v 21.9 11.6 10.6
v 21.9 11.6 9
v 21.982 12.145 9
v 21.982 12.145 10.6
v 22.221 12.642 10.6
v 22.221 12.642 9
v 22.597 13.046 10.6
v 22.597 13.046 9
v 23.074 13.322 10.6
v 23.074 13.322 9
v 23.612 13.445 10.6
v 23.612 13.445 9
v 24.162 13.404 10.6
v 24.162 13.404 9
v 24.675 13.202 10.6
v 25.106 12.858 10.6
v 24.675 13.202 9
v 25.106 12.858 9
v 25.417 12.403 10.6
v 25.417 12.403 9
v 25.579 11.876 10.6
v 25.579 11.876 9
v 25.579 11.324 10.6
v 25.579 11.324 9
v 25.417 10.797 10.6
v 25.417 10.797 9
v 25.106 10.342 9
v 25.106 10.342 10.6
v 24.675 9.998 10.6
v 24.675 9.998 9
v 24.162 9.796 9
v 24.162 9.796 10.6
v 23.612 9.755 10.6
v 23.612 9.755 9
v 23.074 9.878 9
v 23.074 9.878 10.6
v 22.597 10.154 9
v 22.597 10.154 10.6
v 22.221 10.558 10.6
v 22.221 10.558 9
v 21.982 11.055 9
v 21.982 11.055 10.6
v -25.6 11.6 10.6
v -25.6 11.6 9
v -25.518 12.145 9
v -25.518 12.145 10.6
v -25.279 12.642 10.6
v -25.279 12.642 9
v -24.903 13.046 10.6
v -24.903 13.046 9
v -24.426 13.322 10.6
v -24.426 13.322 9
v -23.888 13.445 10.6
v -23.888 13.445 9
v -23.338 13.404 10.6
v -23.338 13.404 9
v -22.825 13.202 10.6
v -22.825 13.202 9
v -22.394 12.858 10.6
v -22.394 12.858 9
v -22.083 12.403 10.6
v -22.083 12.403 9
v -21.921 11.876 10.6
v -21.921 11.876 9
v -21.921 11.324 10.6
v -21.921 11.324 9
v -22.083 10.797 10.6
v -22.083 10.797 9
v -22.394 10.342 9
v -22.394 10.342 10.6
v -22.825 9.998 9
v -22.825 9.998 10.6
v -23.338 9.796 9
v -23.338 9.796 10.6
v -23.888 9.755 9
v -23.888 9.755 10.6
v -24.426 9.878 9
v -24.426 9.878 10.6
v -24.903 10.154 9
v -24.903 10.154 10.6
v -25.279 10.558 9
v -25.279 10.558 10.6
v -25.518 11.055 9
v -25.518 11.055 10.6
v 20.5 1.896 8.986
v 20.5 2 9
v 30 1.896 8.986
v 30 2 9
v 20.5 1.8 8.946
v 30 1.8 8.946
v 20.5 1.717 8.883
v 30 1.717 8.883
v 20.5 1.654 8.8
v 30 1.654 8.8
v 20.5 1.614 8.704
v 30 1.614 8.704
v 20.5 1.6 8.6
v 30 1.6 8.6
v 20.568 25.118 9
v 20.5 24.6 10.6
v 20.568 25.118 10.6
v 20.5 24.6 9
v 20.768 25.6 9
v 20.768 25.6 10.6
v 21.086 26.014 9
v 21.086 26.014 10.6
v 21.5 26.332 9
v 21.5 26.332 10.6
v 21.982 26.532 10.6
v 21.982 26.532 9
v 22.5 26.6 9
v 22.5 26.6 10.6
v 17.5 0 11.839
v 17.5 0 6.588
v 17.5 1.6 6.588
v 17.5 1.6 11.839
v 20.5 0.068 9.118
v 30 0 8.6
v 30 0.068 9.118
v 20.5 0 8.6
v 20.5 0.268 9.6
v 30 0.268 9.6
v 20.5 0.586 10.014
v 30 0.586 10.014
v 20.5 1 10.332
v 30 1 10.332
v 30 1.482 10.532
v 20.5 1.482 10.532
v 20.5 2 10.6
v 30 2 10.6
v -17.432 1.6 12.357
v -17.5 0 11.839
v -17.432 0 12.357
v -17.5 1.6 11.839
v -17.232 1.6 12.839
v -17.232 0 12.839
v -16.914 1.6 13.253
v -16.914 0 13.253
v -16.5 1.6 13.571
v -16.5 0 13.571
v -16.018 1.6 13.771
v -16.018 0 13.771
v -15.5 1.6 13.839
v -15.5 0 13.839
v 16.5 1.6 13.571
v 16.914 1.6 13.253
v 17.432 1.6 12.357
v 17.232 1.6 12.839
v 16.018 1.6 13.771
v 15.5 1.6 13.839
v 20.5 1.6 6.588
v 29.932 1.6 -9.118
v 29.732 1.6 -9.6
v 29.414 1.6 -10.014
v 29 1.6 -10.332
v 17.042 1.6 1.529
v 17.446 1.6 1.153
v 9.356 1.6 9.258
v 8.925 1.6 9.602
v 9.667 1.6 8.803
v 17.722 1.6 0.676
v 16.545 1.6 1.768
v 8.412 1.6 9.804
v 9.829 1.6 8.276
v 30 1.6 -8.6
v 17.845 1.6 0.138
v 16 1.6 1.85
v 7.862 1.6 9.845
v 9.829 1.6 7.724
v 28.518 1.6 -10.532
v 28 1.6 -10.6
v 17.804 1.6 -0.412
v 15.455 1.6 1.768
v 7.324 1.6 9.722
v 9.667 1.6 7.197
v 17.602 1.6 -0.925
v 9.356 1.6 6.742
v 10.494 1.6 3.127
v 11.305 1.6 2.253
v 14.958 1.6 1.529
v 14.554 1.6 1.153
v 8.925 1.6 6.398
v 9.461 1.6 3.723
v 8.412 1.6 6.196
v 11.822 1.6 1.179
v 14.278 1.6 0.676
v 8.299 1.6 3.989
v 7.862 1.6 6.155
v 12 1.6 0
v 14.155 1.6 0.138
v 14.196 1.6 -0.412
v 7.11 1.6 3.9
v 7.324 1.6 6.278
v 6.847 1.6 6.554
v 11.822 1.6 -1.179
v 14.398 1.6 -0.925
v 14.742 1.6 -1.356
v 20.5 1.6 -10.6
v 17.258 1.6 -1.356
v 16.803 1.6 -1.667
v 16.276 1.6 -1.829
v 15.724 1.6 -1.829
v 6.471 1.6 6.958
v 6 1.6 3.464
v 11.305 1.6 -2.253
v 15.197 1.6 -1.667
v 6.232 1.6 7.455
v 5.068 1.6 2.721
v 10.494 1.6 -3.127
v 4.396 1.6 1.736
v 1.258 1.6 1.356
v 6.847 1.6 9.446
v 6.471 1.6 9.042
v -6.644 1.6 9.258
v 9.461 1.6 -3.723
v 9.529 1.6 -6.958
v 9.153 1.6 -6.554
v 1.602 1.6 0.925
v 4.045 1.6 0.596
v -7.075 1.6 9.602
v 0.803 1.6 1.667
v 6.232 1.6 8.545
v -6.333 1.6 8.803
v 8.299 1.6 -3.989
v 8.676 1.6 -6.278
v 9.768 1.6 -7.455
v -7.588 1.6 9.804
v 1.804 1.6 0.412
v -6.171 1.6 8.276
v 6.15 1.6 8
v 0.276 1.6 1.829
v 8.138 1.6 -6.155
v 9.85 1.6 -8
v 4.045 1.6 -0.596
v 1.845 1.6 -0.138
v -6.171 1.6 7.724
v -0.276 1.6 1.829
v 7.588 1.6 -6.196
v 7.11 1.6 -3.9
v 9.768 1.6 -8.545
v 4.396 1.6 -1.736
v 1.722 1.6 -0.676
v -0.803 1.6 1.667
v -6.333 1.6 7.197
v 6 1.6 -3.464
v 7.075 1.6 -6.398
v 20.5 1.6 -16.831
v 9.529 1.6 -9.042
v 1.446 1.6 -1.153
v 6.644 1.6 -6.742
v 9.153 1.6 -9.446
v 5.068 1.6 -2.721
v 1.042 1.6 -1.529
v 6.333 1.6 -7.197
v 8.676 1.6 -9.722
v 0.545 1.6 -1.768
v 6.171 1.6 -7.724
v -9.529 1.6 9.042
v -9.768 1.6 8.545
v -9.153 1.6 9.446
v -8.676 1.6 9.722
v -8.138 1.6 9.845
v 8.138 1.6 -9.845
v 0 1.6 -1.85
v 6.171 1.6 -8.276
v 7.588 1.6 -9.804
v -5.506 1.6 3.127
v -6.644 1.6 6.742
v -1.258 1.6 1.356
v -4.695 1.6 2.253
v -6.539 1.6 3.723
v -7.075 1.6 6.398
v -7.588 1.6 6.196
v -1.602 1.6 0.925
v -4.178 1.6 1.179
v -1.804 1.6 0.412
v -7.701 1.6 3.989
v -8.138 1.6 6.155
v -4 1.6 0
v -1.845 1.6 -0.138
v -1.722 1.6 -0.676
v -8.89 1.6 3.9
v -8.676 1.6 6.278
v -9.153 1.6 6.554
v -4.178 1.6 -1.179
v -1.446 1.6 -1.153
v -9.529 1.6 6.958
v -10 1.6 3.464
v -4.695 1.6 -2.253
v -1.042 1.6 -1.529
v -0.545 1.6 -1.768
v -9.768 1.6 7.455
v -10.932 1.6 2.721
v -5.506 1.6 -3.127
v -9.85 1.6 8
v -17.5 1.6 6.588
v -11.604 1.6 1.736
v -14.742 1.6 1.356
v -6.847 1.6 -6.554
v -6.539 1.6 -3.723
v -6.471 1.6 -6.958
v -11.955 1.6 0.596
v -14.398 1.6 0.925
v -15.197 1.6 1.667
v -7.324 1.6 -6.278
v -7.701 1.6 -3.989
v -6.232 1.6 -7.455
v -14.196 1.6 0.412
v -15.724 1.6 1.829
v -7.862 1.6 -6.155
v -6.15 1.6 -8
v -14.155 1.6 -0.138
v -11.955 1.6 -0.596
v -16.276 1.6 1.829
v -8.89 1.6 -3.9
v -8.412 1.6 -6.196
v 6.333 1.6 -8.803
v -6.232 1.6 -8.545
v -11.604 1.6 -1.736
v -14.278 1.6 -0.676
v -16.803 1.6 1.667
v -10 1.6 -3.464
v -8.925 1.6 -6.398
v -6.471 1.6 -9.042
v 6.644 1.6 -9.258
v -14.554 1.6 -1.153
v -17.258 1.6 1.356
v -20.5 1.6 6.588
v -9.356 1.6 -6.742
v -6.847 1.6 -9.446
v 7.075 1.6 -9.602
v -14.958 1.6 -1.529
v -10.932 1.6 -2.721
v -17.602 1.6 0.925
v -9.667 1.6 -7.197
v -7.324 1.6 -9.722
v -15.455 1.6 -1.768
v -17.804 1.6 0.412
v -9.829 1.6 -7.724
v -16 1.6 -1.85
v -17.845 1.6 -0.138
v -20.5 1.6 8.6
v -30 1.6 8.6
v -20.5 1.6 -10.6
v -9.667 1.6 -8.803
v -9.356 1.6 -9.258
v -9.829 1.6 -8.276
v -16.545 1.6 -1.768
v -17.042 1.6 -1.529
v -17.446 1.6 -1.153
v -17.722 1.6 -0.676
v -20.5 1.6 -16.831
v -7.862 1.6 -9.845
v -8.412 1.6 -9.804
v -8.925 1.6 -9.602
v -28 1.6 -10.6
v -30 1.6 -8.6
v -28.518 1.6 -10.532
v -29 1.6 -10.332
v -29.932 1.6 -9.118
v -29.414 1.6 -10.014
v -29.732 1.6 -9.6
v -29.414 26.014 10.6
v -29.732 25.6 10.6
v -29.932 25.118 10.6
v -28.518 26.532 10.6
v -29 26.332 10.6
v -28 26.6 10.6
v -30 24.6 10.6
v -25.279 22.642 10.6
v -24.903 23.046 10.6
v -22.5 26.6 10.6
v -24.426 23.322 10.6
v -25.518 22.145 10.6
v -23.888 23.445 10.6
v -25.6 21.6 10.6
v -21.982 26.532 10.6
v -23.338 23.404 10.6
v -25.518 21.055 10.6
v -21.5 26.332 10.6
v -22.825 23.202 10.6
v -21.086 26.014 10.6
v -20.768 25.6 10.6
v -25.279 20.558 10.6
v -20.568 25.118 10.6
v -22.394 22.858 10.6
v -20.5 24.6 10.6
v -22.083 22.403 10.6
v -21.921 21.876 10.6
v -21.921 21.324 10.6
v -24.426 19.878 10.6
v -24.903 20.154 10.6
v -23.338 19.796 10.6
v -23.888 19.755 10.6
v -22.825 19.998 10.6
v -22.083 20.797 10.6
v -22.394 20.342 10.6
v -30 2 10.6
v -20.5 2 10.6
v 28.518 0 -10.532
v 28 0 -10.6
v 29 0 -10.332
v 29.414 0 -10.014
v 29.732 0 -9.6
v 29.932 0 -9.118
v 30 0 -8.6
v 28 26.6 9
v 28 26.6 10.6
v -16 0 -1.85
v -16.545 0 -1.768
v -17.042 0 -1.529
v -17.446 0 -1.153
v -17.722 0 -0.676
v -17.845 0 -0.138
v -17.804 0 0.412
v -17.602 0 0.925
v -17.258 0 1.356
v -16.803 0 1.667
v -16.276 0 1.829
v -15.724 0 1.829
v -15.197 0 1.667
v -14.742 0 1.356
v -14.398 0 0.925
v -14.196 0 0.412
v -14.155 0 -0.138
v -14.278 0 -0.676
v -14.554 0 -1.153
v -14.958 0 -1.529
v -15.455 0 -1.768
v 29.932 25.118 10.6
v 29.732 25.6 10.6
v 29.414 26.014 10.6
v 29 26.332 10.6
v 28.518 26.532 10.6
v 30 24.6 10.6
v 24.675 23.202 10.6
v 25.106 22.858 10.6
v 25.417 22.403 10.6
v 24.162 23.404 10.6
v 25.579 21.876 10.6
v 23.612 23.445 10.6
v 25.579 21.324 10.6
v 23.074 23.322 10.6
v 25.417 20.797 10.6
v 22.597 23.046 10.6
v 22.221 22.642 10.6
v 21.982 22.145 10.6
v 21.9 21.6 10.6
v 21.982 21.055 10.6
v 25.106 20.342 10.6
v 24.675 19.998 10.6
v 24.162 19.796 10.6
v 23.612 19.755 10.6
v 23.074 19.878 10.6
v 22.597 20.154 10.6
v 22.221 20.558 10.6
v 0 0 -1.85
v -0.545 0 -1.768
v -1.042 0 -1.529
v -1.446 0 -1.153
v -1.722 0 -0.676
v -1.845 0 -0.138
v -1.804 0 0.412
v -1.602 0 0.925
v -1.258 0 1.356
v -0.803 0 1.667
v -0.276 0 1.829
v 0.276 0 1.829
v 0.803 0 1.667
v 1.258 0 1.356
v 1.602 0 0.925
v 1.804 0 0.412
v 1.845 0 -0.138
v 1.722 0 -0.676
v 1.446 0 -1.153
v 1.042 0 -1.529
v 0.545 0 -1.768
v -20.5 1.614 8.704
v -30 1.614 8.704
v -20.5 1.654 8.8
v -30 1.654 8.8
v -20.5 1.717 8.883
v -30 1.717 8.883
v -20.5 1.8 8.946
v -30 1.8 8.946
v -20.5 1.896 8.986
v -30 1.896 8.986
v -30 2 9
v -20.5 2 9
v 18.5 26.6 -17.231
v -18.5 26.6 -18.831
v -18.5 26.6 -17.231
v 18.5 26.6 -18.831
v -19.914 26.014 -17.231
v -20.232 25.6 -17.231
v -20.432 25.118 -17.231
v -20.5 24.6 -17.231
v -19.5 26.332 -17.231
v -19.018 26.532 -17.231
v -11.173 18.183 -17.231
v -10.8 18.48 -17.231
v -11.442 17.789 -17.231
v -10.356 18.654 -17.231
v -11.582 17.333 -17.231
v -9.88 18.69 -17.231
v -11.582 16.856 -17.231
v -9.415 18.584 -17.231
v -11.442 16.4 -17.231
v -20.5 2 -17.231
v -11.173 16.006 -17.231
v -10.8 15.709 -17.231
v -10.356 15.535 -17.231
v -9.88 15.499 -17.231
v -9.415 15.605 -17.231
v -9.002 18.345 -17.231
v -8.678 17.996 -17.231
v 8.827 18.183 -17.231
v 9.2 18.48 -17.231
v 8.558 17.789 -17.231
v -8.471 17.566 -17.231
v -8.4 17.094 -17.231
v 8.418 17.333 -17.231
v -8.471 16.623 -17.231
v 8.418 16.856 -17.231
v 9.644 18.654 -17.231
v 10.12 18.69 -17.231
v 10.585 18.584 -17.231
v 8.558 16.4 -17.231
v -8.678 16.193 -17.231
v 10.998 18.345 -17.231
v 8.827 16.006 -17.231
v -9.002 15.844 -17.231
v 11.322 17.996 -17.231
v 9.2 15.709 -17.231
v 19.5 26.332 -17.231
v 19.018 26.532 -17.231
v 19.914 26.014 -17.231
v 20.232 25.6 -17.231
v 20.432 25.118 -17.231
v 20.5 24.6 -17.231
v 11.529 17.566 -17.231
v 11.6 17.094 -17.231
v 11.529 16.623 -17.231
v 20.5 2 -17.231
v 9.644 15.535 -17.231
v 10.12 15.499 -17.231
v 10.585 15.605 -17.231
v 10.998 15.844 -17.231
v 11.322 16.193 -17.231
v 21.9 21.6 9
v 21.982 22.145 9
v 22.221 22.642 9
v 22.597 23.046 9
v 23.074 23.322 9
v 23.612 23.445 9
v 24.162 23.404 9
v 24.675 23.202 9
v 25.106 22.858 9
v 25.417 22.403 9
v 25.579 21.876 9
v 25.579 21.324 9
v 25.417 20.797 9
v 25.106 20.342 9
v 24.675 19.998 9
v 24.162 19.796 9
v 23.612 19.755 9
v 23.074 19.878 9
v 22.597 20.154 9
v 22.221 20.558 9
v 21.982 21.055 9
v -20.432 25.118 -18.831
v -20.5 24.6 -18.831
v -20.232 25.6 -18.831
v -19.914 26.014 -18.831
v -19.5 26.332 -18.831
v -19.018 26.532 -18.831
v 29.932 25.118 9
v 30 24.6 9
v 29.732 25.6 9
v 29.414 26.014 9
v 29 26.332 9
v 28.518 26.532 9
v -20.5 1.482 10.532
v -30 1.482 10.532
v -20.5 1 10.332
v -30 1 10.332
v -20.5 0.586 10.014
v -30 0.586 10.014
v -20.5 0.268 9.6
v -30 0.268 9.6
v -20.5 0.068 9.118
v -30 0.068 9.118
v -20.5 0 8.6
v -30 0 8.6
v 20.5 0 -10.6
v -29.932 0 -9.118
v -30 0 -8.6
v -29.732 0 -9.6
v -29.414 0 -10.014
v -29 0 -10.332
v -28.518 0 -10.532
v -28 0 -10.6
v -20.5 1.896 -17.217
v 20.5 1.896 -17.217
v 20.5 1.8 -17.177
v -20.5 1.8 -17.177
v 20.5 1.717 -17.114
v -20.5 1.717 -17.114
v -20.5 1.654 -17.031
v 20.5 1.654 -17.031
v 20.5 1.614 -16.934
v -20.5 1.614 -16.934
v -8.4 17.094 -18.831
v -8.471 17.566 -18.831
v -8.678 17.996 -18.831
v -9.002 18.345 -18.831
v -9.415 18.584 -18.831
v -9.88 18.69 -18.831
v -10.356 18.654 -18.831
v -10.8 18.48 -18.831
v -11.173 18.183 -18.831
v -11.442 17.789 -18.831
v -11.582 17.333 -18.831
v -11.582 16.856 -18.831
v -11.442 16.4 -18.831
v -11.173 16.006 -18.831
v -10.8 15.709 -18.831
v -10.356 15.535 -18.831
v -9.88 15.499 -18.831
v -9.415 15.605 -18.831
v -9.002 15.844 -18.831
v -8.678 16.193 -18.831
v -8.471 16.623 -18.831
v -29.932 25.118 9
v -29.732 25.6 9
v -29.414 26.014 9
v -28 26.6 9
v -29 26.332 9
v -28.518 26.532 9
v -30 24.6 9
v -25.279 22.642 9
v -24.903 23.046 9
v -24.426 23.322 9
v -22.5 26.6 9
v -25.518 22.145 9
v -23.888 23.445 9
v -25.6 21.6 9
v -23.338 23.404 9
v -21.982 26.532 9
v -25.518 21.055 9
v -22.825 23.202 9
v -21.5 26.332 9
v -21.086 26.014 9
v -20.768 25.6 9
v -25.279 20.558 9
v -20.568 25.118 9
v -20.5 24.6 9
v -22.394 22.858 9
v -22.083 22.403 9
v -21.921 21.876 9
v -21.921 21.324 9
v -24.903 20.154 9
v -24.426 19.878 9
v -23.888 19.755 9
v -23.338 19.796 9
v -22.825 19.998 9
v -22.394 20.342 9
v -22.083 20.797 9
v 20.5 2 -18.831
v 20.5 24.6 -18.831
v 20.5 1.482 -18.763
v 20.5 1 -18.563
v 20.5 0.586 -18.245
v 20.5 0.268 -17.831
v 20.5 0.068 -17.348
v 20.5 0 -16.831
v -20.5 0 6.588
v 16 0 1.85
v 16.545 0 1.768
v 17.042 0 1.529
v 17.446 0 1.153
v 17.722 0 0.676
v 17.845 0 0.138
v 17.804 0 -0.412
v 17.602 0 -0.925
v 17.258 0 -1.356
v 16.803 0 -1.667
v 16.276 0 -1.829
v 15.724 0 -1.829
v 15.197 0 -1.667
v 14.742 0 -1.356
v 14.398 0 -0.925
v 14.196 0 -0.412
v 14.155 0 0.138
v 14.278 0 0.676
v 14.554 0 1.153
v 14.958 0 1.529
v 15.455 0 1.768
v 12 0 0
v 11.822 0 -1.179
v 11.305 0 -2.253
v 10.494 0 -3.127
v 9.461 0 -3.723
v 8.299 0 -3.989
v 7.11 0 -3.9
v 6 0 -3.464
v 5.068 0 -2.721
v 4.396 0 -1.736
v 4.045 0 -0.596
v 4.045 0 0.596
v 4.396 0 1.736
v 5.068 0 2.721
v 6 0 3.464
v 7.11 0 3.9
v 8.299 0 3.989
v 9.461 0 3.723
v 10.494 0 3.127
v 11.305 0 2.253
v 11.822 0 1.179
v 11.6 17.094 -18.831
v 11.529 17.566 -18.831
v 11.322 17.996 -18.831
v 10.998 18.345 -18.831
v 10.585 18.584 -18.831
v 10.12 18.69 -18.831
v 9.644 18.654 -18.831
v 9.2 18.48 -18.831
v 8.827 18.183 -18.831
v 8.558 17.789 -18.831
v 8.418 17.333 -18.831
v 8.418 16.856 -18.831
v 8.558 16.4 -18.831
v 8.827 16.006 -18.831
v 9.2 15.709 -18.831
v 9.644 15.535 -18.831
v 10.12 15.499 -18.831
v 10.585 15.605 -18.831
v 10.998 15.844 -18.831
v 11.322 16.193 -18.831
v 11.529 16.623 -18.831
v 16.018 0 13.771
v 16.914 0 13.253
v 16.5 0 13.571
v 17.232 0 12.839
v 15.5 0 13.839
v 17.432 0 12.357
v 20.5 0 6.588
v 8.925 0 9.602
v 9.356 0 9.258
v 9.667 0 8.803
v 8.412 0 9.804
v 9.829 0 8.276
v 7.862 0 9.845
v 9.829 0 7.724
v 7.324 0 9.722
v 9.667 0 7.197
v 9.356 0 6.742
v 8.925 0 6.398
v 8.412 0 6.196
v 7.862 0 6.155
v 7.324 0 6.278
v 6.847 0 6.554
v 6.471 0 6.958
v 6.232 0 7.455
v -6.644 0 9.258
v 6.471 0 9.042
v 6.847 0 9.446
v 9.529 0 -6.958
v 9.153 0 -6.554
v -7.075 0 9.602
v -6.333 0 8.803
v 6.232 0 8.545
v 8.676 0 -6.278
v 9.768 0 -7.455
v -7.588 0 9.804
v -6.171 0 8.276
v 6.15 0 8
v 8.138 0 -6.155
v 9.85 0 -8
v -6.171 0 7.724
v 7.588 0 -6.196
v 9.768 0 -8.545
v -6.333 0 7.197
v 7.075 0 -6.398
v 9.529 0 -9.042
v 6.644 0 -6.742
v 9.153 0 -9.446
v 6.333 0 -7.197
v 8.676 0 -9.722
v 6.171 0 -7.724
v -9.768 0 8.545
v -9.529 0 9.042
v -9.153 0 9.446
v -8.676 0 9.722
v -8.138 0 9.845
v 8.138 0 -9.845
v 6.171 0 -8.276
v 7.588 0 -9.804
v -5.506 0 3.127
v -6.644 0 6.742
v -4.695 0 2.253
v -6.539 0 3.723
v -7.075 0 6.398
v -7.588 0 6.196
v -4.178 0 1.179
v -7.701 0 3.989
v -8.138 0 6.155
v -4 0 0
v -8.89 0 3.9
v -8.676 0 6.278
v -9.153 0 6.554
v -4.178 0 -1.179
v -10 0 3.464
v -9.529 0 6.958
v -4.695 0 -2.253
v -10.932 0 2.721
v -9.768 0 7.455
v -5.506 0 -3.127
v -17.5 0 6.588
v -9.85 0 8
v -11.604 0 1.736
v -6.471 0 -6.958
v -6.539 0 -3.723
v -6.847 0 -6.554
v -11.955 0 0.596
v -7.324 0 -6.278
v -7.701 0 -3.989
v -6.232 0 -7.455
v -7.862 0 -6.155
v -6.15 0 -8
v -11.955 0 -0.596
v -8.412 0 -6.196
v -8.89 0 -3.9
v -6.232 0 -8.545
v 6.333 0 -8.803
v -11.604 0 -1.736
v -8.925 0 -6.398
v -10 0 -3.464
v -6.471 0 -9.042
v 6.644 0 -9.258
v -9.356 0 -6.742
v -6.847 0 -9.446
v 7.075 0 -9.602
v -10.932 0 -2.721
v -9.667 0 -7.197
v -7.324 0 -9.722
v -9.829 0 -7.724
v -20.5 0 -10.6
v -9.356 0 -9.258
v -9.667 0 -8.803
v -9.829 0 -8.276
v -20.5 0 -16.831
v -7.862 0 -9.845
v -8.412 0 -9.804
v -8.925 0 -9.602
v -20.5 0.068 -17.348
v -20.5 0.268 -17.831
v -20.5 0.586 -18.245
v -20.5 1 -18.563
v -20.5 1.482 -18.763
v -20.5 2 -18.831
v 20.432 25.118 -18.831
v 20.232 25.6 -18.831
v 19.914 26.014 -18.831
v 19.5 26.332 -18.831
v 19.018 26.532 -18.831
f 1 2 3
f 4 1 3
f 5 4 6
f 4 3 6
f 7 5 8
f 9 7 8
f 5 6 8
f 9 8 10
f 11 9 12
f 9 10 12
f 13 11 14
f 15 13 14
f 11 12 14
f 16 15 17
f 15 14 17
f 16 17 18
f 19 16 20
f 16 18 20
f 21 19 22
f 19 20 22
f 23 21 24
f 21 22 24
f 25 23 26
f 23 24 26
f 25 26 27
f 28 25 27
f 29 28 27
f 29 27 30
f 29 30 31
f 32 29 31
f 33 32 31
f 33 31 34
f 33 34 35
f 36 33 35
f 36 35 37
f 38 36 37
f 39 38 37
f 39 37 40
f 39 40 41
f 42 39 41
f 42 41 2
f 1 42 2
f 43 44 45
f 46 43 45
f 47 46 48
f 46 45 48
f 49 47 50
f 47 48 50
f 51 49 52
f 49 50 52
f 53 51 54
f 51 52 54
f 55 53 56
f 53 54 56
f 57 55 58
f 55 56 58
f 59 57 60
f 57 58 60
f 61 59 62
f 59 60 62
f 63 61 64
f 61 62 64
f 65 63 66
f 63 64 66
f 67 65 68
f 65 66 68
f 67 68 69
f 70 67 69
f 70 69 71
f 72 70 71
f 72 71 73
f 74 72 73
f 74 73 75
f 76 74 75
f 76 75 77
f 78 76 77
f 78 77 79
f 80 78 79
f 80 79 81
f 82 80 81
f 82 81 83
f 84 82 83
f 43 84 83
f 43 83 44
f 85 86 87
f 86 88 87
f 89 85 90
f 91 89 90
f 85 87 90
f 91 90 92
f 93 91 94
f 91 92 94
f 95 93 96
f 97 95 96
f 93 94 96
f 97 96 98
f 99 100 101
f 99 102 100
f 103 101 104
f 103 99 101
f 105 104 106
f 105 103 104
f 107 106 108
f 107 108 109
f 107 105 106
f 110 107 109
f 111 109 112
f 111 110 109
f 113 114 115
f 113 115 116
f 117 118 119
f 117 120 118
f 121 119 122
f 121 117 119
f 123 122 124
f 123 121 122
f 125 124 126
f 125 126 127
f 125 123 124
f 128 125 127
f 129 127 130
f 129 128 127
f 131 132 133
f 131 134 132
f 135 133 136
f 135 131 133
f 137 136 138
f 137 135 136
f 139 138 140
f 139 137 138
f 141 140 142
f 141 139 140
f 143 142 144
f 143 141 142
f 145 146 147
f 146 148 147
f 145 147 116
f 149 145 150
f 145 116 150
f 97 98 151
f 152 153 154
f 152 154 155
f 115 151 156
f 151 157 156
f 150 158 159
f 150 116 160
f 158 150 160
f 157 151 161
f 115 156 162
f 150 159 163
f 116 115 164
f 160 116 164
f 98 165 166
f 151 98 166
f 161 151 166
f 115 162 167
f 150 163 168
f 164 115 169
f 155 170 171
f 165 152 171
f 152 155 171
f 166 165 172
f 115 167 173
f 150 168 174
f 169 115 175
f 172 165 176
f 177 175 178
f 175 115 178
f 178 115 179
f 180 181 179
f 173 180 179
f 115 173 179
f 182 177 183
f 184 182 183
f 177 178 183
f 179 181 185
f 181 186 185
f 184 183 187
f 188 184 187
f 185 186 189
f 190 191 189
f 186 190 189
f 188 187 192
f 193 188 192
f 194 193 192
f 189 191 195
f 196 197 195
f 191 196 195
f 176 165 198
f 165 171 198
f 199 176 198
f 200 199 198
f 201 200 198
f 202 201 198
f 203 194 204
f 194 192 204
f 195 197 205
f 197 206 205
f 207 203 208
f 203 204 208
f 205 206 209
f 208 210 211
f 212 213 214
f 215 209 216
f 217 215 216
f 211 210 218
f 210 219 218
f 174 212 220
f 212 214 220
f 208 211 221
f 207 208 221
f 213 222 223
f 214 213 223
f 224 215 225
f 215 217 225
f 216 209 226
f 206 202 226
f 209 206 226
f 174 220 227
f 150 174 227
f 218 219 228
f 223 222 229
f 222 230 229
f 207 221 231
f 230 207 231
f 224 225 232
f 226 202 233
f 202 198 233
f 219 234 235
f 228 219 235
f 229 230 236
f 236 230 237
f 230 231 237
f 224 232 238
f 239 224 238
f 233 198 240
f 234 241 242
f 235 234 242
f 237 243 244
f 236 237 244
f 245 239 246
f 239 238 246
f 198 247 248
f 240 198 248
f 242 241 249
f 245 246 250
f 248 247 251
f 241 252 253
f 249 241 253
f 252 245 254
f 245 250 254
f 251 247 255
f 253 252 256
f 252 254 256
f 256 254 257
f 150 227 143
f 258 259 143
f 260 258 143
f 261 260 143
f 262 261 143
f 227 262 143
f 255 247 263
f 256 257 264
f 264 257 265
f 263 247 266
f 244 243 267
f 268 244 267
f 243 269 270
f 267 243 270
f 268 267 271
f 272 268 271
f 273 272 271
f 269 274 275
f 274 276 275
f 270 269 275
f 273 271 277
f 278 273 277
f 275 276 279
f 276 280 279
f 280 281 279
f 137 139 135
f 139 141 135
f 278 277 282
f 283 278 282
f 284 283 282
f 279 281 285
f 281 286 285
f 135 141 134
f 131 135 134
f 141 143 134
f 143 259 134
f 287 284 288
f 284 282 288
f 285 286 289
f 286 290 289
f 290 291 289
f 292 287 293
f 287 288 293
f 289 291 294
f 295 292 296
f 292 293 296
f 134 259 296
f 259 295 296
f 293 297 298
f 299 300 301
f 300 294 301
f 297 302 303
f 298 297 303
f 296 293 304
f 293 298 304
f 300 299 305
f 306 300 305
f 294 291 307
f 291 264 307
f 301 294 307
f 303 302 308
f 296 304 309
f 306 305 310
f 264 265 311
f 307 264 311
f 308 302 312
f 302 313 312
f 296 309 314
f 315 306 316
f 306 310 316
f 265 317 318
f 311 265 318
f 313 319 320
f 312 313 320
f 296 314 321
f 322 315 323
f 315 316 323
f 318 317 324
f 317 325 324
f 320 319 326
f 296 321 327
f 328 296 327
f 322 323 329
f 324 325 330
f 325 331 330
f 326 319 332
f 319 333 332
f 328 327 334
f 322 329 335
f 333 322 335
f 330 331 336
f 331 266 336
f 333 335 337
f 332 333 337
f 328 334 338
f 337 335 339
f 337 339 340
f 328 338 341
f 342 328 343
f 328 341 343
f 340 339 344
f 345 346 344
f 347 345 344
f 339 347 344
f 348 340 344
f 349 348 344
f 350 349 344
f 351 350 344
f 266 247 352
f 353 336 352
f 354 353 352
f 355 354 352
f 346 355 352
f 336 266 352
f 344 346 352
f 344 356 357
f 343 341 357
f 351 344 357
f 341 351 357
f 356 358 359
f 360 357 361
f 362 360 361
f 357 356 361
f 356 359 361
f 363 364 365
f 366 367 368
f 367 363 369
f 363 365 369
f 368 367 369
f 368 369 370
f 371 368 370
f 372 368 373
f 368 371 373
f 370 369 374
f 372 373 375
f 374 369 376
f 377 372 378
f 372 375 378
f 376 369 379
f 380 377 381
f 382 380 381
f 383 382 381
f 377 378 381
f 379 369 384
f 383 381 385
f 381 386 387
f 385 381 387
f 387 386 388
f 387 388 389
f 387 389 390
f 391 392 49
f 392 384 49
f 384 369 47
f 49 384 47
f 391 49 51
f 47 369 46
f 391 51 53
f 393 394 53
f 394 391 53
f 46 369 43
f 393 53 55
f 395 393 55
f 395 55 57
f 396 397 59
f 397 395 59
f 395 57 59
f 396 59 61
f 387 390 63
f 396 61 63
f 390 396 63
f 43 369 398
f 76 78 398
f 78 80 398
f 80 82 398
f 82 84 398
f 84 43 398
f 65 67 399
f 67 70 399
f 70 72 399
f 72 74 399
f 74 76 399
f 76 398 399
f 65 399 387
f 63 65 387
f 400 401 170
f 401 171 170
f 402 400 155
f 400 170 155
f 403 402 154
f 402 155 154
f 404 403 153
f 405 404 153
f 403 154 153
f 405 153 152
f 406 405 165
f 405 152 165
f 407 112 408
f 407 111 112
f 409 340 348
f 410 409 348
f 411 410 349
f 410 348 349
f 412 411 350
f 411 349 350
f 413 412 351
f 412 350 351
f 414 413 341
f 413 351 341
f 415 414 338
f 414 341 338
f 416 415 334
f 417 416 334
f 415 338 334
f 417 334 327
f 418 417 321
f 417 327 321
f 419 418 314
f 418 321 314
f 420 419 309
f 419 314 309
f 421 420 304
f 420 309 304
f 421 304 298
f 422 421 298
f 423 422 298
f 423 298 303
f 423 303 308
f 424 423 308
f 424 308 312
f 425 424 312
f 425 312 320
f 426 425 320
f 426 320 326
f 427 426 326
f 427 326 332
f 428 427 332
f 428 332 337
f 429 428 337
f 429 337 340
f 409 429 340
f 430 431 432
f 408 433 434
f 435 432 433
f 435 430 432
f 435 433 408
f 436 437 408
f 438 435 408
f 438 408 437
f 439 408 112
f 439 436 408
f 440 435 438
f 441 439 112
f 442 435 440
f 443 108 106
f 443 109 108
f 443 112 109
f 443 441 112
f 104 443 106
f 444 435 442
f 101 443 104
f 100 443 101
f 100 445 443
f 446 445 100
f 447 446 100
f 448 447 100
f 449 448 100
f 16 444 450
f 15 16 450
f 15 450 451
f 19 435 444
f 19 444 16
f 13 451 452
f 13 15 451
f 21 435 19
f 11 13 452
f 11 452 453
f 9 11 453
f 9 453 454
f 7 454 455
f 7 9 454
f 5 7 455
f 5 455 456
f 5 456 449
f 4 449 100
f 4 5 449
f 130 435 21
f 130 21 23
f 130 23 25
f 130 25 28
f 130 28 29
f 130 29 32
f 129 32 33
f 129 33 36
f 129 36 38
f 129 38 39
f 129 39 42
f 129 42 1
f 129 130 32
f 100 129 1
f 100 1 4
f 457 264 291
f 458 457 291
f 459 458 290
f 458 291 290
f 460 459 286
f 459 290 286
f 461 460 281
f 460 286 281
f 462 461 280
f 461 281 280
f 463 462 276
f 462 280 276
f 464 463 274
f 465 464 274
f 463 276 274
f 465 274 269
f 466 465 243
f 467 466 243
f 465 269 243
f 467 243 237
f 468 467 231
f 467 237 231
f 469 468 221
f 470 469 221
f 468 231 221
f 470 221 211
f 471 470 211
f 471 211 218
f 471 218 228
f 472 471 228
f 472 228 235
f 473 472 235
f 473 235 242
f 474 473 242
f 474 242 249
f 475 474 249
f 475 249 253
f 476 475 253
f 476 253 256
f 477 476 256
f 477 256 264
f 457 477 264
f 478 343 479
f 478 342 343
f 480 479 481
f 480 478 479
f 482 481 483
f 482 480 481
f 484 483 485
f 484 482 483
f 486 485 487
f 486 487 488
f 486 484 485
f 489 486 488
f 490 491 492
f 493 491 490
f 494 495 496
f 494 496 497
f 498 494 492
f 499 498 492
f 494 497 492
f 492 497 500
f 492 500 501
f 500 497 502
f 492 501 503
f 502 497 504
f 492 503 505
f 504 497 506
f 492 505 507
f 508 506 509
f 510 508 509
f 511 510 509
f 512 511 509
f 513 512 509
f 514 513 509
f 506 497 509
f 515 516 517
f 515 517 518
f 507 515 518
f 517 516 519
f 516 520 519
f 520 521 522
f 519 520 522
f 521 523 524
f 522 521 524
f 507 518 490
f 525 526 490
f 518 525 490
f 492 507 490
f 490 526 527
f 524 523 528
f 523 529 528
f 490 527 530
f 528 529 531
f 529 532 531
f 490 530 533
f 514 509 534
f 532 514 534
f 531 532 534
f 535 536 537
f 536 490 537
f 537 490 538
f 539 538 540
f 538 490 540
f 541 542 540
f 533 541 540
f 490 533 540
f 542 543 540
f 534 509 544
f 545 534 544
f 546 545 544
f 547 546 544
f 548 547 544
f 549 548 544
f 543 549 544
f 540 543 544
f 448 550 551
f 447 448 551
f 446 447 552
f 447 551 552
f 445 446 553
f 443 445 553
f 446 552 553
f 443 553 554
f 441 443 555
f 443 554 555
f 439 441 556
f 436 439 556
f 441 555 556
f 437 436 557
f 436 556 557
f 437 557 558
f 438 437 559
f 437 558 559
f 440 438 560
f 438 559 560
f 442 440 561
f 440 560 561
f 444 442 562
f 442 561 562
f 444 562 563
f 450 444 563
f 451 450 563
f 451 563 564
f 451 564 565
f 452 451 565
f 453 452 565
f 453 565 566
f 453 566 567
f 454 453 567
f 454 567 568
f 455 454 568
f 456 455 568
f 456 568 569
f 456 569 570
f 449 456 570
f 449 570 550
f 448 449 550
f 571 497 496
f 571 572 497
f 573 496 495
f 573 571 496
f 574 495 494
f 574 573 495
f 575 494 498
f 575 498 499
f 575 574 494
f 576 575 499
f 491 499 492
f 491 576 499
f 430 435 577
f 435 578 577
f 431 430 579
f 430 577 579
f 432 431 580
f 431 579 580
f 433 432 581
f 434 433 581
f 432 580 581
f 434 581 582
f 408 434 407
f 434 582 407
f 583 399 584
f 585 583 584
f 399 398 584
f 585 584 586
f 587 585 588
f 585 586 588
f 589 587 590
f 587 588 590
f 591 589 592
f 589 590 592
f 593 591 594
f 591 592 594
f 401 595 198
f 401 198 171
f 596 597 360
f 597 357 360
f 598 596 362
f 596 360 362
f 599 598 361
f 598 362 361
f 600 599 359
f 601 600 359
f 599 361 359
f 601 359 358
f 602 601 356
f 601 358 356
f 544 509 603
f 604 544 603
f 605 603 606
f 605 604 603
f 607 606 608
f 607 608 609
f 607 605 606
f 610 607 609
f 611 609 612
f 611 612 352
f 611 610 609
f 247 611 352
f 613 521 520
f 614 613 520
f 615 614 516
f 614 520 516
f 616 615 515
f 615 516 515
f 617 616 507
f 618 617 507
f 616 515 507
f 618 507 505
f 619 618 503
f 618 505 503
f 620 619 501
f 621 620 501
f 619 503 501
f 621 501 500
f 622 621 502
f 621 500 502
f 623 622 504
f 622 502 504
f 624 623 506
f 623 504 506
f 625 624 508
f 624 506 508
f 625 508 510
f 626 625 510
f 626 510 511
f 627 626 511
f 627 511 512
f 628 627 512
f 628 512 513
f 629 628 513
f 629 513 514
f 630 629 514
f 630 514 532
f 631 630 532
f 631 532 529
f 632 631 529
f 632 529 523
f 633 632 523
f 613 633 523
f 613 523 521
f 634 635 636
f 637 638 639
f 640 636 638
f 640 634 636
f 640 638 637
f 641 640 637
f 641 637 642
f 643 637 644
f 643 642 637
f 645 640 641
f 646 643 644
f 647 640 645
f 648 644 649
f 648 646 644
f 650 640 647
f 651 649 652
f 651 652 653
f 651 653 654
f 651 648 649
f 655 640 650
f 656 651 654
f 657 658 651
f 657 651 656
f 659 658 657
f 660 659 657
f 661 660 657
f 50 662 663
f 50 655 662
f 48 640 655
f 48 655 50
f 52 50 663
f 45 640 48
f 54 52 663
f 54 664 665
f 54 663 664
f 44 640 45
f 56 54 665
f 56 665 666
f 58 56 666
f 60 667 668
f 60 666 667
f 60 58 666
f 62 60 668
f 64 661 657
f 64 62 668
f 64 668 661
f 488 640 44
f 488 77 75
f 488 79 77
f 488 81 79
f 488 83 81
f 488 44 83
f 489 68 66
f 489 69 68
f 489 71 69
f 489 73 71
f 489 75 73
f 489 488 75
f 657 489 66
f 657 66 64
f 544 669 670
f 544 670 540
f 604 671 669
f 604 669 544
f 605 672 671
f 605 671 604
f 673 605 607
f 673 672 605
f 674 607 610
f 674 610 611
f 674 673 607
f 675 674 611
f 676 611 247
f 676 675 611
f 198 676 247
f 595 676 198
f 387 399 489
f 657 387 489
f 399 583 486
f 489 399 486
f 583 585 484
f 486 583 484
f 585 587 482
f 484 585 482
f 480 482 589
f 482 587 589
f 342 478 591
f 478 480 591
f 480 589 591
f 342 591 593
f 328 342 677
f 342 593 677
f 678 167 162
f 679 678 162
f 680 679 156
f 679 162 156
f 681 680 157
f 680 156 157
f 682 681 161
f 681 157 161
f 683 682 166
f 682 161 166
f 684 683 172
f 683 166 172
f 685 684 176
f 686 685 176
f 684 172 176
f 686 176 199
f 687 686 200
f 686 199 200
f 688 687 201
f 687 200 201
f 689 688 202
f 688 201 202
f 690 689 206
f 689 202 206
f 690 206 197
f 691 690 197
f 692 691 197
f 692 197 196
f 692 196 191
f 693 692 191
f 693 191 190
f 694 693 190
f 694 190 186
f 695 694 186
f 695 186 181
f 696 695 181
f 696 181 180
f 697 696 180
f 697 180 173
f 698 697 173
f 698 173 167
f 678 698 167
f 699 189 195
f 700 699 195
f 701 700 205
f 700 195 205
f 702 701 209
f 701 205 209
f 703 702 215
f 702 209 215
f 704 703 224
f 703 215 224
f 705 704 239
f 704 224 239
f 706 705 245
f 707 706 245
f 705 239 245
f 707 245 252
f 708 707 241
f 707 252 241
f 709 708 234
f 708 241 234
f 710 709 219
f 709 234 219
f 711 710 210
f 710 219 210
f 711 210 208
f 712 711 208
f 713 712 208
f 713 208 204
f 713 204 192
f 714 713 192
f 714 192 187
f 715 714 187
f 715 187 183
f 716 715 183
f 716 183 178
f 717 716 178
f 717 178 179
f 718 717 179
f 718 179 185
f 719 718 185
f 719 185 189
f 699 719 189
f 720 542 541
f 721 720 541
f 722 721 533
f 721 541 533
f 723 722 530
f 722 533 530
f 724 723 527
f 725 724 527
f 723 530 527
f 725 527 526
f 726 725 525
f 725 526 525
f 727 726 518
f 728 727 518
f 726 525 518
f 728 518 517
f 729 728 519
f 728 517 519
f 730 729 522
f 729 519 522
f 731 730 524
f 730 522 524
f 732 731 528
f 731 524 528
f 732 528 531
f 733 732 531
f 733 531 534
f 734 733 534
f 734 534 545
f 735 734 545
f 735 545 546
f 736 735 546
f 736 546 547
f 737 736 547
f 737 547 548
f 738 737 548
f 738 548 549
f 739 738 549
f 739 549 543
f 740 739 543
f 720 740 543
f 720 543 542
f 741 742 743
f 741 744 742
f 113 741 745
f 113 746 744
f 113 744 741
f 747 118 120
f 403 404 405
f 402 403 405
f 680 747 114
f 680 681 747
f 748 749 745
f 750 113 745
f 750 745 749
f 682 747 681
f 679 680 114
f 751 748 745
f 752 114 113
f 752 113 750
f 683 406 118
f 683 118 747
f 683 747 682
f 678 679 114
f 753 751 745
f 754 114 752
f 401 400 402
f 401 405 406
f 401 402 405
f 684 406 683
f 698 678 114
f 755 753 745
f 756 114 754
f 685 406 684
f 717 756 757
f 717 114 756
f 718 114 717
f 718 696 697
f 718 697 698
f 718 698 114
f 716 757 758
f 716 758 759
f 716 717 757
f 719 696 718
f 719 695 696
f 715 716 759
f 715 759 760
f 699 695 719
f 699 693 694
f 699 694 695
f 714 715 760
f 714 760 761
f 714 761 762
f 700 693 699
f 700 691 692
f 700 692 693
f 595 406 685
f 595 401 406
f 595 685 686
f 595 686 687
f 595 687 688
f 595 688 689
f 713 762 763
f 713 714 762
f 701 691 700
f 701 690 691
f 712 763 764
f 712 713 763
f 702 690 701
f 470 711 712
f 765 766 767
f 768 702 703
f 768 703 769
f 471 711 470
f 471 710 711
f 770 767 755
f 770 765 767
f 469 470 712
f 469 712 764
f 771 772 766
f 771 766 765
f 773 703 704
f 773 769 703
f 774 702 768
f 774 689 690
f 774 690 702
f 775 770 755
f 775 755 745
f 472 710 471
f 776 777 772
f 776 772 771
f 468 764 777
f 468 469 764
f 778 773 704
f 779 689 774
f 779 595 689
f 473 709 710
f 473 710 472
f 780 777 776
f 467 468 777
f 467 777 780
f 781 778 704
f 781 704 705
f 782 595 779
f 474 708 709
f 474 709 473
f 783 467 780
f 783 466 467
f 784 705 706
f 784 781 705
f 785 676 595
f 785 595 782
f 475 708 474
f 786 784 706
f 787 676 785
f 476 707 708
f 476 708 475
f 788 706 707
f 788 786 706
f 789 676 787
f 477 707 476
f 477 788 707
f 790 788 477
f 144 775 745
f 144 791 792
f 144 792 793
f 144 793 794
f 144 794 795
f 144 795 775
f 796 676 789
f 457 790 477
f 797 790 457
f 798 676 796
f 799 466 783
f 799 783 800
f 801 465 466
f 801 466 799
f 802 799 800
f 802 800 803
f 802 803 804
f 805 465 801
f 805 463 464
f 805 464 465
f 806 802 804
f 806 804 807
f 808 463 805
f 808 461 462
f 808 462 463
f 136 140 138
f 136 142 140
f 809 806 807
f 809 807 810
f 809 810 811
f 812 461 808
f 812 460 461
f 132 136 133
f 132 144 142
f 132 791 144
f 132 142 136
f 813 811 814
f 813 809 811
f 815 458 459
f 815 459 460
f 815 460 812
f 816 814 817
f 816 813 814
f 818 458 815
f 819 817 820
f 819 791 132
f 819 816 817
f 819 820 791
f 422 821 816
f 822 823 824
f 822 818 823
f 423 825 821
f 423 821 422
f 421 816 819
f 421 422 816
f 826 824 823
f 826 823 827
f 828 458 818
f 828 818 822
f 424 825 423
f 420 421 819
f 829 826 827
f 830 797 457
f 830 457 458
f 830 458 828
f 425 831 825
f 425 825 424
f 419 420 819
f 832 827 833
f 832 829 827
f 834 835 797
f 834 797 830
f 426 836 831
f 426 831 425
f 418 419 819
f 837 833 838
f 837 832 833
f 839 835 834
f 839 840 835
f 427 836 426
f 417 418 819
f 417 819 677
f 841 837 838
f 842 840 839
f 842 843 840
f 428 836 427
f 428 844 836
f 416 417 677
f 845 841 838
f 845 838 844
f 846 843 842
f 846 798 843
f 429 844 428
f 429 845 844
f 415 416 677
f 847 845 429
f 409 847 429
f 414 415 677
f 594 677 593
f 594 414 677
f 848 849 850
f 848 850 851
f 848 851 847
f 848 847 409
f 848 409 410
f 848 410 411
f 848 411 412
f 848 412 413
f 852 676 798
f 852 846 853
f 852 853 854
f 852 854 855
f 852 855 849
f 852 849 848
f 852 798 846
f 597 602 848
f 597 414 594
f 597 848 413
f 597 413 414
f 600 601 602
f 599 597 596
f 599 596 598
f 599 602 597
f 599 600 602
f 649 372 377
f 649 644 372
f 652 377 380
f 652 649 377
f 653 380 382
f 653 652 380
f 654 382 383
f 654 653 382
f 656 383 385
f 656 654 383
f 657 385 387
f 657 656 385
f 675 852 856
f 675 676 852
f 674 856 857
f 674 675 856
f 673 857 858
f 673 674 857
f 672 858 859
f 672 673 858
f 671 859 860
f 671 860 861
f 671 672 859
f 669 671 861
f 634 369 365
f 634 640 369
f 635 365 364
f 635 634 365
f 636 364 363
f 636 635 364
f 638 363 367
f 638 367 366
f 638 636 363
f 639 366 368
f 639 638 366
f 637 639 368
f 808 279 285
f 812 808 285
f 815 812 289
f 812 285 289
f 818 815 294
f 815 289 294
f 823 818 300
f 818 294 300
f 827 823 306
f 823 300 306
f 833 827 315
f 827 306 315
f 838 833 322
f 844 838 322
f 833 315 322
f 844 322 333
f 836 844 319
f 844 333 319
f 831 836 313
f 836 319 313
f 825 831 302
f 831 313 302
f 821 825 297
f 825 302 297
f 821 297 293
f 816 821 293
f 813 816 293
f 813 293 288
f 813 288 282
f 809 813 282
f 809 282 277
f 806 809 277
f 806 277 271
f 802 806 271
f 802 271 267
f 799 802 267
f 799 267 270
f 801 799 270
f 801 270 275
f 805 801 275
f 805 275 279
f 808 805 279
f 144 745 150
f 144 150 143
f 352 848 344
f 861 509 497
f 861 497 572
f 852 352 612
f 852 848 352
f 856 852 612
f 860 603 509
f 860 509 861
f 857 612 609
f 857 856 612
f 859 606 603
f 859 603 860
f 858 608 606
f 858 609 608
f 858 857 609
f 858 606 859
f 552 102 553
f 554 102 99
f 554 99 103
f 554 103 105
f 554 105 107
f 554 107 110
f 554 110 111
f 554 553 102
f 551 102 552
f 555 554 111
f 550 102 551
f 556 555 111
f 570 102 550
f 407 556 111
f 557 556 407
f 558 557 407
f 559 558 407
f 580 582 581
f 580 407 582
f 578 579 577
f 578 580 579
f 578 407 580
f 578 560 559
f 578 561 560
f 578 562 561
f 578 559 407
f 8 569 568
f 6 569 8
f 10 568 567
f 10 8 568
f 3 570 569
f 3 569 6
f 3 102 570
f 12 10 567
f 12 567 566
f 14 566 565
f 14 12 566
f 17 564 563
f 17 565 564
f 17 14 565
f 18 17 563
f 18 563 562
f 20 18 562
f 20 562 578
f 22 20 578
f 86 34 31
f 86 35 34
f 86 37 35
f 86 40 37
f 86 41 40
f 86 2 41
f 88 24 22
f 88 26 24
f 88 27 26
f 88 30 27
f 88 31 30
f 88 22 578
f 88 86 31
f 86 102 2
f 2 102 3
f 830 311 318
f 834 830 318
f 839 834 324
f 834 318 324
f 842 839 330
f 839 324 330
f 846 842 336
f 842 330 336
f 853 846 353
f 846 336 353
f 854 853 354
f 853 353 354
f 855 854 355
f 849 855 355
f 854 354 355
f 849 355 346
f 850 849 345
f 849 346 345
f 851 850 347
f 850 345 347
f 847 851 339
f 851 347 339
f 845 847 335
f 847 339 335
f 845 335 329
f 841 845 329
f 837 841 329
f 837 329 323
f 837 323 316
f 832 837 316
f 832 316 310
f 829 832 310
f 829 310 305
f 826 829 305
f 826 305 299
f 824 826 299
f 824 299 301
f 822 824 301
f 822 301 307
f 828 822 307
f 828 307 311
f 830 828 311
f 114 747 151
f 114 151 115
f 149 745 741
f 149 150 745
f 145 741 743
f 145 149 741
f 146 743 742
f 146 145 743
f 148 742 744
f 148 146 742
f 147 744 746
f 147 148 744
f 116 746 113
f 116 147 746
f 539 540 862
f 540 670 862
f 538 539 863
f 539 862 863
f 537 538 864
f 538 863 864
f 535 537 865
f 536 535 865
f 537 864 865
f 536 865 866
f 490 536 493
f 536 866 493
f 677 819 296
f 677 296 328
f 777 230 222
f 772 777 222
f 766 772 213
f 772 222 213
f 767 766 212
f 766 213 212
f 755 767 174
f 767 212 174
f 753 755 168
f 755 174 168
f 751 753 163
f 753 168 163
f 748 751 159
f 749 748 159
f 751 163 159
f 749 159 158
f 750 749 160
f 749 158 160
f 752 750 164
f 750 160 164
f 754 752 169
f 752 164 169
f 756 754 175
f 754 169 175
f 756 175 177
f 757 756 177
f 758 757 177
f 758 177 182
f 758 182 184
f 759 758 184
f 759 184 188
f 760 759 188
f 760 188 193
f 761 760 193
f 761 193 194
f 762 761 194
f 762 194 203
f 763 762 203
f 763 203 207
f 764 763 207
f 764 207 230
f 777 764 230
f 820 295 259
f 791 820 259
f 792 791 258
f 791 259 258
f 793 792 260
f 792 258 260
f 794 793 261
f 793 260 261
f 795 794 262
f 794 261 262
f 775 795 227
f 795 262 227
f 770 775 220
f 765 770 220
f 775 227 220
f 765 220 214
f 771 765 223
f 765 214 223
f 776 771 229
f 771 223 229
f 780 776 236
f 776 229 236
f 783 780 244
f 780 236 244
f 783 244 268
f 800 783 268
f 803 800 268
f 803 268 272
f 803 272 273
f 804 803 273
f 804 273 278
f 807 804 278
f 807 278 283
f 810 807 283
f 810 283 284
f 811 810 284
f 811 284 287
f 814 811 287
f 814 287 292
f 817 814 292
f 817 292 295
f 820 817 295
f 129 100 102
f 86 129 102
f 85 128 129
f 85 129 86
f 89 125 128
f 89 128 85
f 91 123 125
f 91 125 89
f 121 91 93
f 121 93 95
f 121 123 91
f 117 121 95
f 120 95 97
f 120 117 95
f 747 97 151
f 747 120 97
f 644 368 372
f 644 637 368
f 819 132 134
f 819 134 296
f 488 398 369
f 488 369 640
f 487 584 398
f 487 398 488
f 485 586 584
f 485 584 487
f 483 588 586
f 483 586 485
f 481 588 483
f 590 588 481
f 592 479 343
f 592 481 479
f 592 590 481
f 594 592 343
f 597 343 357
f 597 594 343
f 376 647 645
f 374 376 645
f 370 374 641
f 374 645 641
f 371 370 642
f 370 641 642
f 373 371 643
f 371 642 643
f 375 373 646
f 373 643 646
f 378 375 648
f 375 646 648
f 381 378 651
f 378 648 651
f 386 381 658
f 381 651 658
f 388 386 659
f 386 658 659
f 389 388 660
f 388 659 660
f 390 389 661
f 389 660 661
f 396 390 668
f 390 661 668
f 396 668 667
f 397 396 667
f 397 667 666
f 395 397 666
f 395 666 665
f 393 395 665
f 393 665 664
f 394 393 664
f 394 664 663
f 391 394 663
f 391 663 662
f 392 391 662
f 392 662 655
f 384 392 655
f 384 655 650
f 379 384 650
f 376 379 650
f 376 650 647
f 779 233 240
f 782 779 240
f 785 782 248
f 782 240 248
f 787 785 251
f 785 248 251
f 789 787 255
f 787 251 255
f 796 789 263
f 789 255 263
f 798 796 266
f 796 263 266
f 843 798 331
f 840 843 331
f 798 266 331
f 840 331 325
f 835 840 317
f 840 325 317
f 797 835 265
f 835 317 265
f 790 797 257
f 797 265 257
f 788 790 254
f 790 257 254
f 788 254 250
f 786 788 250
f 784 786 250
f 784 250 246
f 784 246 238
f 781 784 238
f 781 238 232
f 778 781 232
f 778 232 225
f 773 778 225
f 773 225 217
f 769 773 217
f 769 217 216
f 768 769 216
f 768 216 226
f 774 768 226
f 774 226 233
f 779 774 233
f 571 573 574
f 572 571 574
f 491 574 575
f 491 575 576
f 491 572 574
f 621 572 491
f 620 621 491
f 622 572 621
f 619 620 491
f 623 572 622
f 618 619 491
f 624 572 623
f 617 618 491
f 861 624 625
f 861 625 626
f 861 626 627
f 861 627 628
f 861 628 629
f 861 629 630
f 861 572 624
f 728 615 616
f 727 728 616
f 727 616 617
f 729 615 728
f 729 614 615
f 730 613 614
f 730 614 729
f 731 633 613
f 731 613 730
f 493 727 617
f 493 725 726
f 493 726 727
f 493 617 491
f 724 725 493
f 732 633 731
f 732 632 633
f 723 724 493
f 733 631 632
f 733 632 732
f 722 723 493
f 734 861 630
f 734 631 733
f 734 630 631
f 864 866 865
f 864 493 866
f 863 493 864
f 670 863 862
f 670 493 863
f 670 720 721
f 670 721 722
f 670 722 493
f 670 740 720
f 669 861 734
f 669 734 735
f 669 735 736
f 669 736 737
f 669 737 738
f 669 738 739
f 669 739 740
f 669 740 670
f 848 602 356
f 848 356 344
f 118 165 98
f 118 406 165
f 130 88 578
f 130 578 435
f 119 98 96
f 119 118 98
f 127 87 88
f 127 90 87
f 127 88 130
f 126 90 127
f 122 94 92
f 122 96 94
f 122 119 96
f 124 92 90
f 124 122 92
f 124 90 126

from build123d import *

# Parameters (mm, degrees)
EXTRUDE1_DEPTH             = 1.6
SKETCH2_W                  = 9.5
SKETCH2_H                  = 1.6
SKETCH2_W_2                = 41
EXTRUDE2_DEPTH             = 25
FILLET2_R                  = 0.4
FILLET3_R                  = 2
F_3_7_3_7_DIAMETER_HOLE1_D = 3.7
SKETCH4_R                  = 1.6
CUT_EXTRUDE2_DEPTH         = 2.6
SKETCH5_R                  = 4
CUT_EXTRUDE3_DEPTH         = 2.6
SKETCH5_3_R                = 1.85
CUT_EXTRUDE4_DEPTH         = 2.6
CIRPATTERN1_COUNT          = 4
SKETCH5_4_R                = 1.85
CUT_EXTRUDE5_DEPTH         = 10
CIRPATTERN2_COUNT          = 4


with BuildPart() as part:
    # Sketch1 → Extrude1 (new body)
    with BuildSketch(Plane(origin=(0, 0, 0), x_dir=(1, 0, 0), z_dir=(0, 1, 0))):
        Polygon((-30, -10.6), (-30, 10.6), (-20.5, 10.6), (-20.5, 18.83069384), (20.5, 18.83069384), (20.5, 10.6), (30, 10.6), (30, -10.6), (20.5, -10.6), (20.5, -6.588025881), (17.5, -6.588025881), (17.5, -13.838875216), (-17.5, -13.838875216), (-17.5, -6.588025881), (-20.5, -6.588025881), (-20.5, -10.6), align=None)
    extrude(amount=EXTRUDE1_DEPTH)

    # Sketch2 → Extrude2 (add)
    with BuildSketch(Plane(origin=(0, 1.6, 0), x_dir=(1, 0, 0), z_dir=(0, 1, 0))):
        with Locations((-25.25, -9.8)):
            Rectangle(SKETCH2_W, SKETCH2_H)
        with Locations((25.25, -9.8)):
            Rectangle(SKETCH2_W, SKETCH2_H)
        with Locations((0, 18.03069384)):
            Rectangle(SKETCH2_W_2, SKETCH2_H)
    extrude(amount=EXTRUDE2_DEPTH)

    # Fillet2
    fillet2_edges = [part.edges().sort_by_distance(p)[0] for p in [
        (-25.25, 1.6, 9),
        (25.25, 1.6, 9),
        (0, 1.6, -17.23069384),
    ]]
    fillet(fillet2_edges, radius=FILLET2_R)

    # Fillet3
    fillet3_edges = [part.edges().sort_by_distance(p)[0] for p in [
        (-30, 0.8, -10.6),
        (-17.5, 0.8, 13.838875216),
        (30, 0.8, -10.6),
        (20.5, 26.6, 9.8),
        (30, 26.6, 9.8),
        (20.5, 26.6, -18.03069384),
        (-20.5, 26.6, -18.03069384),
        (-30, 26.6, 9.8),
        (-20.5, 26.6, 9.8),
        (-25.25, 0, 10.6),
        (25.25, 0, 10.6),
        (0, 0, -18.83069384),
        (17.5, 0.8, 13.838875216),
    ]]
    fillet(fillet3_edges, radius=FILLET3_R)

    # 3.7 _3.7_ Diameter Hole1 (through all)
    with Locations(Plane.XY.offset(10.6)):
        with Locations((-23.75, 21.6), (-23.75, 11.6), (23.75, 11.6), (23.75, 21.6)):
            Hole(F_3_7_3_7_DIAMETER_HOLE1_D / 2)

    # Sketch4 → Cut-Extrude2 (cut, through all)
    with BuildSketch(Plane.XY.offset(-17.23069384)):
        with Locations((10, 17.09445923)):
            Circle(SKETCH4_R)
        with Locations((-10, 17.09445923)):
            Circle(SKETCH4_R)
    extrude(amount=-CUT_EXTRUDE2_DEPTH, mode=Mode.SUBTRACT)

    # Sketch5 → Cut-Extrude3 (cut, through all)
    with BuildSketch(Plane(origin=(0, 1.6, 0), x_dir=(1, 0, 0), z_dir=(0, 1, 0))):
        with Locations((8, 0)):
            Circle(SKETCH5_R)
        with Locations((-8, 0)):
            Circle(SKETCH5_R)
    extrude(amount=-CUT_EXTRUDE3_DEPTH, mode=Mode.SUBTRACT)

    # Sketch5_3 → Cut-Extrude4 (cut, through all)
    with BuildSketch(Plane(origin=(0, 1.6, 0), x_dir=(1, 0, 0), z_dir=(0, 1, 0))):
        with Locations((8, 8)):
            Circle(SKETCH5_3_R)
    cut_extrude4 = extrude(amount=-CUT_EXTRUDE4_DEPTH, mode=Mode.SUBTRACT)

    # CirPattern1: Cut-Extrude4 ×4 about axis
    cirpattern1_axis = Axis((8, 0, 0), (0, 1, 0))
    for i in range(1, CIRPATTERN1_COUNT):
        add(cut_extrude4.rotate(cirpattern1_axis, i * 360 / CIRPATTERN1_COUNT), mode=Mode.SUBTRACT)

    # Sketch5_4 → Cut-Extrude5 (cut)
    with BuildSketch(Plane(origin=(0, 1.6, 0), x_dir=(1, 0, 0), z_dir=(0, 1, 0))):
        with Locations((-8, 8)):
            Circle(SKETCH5_4_R)
    cut_extrude5 = extrude(amount=-CUT_EXTRUDE5_DEPTH, mode=Mode.SUBTRACT)

    # CirPattern2: Cut-Extrude5 ×4 about axis
    cirpattern2_axis = Axis((-8, 0, 0), (0, 1, 0))
    for i in range(1, CIRPATTERN2_COUNT):
        add(cut_extrude5.rotate(cirpattern2_axis, i * 360 / CIRPATTERN2_COUNT), mode=Mode.SUBTRACT)


solid = part.part
